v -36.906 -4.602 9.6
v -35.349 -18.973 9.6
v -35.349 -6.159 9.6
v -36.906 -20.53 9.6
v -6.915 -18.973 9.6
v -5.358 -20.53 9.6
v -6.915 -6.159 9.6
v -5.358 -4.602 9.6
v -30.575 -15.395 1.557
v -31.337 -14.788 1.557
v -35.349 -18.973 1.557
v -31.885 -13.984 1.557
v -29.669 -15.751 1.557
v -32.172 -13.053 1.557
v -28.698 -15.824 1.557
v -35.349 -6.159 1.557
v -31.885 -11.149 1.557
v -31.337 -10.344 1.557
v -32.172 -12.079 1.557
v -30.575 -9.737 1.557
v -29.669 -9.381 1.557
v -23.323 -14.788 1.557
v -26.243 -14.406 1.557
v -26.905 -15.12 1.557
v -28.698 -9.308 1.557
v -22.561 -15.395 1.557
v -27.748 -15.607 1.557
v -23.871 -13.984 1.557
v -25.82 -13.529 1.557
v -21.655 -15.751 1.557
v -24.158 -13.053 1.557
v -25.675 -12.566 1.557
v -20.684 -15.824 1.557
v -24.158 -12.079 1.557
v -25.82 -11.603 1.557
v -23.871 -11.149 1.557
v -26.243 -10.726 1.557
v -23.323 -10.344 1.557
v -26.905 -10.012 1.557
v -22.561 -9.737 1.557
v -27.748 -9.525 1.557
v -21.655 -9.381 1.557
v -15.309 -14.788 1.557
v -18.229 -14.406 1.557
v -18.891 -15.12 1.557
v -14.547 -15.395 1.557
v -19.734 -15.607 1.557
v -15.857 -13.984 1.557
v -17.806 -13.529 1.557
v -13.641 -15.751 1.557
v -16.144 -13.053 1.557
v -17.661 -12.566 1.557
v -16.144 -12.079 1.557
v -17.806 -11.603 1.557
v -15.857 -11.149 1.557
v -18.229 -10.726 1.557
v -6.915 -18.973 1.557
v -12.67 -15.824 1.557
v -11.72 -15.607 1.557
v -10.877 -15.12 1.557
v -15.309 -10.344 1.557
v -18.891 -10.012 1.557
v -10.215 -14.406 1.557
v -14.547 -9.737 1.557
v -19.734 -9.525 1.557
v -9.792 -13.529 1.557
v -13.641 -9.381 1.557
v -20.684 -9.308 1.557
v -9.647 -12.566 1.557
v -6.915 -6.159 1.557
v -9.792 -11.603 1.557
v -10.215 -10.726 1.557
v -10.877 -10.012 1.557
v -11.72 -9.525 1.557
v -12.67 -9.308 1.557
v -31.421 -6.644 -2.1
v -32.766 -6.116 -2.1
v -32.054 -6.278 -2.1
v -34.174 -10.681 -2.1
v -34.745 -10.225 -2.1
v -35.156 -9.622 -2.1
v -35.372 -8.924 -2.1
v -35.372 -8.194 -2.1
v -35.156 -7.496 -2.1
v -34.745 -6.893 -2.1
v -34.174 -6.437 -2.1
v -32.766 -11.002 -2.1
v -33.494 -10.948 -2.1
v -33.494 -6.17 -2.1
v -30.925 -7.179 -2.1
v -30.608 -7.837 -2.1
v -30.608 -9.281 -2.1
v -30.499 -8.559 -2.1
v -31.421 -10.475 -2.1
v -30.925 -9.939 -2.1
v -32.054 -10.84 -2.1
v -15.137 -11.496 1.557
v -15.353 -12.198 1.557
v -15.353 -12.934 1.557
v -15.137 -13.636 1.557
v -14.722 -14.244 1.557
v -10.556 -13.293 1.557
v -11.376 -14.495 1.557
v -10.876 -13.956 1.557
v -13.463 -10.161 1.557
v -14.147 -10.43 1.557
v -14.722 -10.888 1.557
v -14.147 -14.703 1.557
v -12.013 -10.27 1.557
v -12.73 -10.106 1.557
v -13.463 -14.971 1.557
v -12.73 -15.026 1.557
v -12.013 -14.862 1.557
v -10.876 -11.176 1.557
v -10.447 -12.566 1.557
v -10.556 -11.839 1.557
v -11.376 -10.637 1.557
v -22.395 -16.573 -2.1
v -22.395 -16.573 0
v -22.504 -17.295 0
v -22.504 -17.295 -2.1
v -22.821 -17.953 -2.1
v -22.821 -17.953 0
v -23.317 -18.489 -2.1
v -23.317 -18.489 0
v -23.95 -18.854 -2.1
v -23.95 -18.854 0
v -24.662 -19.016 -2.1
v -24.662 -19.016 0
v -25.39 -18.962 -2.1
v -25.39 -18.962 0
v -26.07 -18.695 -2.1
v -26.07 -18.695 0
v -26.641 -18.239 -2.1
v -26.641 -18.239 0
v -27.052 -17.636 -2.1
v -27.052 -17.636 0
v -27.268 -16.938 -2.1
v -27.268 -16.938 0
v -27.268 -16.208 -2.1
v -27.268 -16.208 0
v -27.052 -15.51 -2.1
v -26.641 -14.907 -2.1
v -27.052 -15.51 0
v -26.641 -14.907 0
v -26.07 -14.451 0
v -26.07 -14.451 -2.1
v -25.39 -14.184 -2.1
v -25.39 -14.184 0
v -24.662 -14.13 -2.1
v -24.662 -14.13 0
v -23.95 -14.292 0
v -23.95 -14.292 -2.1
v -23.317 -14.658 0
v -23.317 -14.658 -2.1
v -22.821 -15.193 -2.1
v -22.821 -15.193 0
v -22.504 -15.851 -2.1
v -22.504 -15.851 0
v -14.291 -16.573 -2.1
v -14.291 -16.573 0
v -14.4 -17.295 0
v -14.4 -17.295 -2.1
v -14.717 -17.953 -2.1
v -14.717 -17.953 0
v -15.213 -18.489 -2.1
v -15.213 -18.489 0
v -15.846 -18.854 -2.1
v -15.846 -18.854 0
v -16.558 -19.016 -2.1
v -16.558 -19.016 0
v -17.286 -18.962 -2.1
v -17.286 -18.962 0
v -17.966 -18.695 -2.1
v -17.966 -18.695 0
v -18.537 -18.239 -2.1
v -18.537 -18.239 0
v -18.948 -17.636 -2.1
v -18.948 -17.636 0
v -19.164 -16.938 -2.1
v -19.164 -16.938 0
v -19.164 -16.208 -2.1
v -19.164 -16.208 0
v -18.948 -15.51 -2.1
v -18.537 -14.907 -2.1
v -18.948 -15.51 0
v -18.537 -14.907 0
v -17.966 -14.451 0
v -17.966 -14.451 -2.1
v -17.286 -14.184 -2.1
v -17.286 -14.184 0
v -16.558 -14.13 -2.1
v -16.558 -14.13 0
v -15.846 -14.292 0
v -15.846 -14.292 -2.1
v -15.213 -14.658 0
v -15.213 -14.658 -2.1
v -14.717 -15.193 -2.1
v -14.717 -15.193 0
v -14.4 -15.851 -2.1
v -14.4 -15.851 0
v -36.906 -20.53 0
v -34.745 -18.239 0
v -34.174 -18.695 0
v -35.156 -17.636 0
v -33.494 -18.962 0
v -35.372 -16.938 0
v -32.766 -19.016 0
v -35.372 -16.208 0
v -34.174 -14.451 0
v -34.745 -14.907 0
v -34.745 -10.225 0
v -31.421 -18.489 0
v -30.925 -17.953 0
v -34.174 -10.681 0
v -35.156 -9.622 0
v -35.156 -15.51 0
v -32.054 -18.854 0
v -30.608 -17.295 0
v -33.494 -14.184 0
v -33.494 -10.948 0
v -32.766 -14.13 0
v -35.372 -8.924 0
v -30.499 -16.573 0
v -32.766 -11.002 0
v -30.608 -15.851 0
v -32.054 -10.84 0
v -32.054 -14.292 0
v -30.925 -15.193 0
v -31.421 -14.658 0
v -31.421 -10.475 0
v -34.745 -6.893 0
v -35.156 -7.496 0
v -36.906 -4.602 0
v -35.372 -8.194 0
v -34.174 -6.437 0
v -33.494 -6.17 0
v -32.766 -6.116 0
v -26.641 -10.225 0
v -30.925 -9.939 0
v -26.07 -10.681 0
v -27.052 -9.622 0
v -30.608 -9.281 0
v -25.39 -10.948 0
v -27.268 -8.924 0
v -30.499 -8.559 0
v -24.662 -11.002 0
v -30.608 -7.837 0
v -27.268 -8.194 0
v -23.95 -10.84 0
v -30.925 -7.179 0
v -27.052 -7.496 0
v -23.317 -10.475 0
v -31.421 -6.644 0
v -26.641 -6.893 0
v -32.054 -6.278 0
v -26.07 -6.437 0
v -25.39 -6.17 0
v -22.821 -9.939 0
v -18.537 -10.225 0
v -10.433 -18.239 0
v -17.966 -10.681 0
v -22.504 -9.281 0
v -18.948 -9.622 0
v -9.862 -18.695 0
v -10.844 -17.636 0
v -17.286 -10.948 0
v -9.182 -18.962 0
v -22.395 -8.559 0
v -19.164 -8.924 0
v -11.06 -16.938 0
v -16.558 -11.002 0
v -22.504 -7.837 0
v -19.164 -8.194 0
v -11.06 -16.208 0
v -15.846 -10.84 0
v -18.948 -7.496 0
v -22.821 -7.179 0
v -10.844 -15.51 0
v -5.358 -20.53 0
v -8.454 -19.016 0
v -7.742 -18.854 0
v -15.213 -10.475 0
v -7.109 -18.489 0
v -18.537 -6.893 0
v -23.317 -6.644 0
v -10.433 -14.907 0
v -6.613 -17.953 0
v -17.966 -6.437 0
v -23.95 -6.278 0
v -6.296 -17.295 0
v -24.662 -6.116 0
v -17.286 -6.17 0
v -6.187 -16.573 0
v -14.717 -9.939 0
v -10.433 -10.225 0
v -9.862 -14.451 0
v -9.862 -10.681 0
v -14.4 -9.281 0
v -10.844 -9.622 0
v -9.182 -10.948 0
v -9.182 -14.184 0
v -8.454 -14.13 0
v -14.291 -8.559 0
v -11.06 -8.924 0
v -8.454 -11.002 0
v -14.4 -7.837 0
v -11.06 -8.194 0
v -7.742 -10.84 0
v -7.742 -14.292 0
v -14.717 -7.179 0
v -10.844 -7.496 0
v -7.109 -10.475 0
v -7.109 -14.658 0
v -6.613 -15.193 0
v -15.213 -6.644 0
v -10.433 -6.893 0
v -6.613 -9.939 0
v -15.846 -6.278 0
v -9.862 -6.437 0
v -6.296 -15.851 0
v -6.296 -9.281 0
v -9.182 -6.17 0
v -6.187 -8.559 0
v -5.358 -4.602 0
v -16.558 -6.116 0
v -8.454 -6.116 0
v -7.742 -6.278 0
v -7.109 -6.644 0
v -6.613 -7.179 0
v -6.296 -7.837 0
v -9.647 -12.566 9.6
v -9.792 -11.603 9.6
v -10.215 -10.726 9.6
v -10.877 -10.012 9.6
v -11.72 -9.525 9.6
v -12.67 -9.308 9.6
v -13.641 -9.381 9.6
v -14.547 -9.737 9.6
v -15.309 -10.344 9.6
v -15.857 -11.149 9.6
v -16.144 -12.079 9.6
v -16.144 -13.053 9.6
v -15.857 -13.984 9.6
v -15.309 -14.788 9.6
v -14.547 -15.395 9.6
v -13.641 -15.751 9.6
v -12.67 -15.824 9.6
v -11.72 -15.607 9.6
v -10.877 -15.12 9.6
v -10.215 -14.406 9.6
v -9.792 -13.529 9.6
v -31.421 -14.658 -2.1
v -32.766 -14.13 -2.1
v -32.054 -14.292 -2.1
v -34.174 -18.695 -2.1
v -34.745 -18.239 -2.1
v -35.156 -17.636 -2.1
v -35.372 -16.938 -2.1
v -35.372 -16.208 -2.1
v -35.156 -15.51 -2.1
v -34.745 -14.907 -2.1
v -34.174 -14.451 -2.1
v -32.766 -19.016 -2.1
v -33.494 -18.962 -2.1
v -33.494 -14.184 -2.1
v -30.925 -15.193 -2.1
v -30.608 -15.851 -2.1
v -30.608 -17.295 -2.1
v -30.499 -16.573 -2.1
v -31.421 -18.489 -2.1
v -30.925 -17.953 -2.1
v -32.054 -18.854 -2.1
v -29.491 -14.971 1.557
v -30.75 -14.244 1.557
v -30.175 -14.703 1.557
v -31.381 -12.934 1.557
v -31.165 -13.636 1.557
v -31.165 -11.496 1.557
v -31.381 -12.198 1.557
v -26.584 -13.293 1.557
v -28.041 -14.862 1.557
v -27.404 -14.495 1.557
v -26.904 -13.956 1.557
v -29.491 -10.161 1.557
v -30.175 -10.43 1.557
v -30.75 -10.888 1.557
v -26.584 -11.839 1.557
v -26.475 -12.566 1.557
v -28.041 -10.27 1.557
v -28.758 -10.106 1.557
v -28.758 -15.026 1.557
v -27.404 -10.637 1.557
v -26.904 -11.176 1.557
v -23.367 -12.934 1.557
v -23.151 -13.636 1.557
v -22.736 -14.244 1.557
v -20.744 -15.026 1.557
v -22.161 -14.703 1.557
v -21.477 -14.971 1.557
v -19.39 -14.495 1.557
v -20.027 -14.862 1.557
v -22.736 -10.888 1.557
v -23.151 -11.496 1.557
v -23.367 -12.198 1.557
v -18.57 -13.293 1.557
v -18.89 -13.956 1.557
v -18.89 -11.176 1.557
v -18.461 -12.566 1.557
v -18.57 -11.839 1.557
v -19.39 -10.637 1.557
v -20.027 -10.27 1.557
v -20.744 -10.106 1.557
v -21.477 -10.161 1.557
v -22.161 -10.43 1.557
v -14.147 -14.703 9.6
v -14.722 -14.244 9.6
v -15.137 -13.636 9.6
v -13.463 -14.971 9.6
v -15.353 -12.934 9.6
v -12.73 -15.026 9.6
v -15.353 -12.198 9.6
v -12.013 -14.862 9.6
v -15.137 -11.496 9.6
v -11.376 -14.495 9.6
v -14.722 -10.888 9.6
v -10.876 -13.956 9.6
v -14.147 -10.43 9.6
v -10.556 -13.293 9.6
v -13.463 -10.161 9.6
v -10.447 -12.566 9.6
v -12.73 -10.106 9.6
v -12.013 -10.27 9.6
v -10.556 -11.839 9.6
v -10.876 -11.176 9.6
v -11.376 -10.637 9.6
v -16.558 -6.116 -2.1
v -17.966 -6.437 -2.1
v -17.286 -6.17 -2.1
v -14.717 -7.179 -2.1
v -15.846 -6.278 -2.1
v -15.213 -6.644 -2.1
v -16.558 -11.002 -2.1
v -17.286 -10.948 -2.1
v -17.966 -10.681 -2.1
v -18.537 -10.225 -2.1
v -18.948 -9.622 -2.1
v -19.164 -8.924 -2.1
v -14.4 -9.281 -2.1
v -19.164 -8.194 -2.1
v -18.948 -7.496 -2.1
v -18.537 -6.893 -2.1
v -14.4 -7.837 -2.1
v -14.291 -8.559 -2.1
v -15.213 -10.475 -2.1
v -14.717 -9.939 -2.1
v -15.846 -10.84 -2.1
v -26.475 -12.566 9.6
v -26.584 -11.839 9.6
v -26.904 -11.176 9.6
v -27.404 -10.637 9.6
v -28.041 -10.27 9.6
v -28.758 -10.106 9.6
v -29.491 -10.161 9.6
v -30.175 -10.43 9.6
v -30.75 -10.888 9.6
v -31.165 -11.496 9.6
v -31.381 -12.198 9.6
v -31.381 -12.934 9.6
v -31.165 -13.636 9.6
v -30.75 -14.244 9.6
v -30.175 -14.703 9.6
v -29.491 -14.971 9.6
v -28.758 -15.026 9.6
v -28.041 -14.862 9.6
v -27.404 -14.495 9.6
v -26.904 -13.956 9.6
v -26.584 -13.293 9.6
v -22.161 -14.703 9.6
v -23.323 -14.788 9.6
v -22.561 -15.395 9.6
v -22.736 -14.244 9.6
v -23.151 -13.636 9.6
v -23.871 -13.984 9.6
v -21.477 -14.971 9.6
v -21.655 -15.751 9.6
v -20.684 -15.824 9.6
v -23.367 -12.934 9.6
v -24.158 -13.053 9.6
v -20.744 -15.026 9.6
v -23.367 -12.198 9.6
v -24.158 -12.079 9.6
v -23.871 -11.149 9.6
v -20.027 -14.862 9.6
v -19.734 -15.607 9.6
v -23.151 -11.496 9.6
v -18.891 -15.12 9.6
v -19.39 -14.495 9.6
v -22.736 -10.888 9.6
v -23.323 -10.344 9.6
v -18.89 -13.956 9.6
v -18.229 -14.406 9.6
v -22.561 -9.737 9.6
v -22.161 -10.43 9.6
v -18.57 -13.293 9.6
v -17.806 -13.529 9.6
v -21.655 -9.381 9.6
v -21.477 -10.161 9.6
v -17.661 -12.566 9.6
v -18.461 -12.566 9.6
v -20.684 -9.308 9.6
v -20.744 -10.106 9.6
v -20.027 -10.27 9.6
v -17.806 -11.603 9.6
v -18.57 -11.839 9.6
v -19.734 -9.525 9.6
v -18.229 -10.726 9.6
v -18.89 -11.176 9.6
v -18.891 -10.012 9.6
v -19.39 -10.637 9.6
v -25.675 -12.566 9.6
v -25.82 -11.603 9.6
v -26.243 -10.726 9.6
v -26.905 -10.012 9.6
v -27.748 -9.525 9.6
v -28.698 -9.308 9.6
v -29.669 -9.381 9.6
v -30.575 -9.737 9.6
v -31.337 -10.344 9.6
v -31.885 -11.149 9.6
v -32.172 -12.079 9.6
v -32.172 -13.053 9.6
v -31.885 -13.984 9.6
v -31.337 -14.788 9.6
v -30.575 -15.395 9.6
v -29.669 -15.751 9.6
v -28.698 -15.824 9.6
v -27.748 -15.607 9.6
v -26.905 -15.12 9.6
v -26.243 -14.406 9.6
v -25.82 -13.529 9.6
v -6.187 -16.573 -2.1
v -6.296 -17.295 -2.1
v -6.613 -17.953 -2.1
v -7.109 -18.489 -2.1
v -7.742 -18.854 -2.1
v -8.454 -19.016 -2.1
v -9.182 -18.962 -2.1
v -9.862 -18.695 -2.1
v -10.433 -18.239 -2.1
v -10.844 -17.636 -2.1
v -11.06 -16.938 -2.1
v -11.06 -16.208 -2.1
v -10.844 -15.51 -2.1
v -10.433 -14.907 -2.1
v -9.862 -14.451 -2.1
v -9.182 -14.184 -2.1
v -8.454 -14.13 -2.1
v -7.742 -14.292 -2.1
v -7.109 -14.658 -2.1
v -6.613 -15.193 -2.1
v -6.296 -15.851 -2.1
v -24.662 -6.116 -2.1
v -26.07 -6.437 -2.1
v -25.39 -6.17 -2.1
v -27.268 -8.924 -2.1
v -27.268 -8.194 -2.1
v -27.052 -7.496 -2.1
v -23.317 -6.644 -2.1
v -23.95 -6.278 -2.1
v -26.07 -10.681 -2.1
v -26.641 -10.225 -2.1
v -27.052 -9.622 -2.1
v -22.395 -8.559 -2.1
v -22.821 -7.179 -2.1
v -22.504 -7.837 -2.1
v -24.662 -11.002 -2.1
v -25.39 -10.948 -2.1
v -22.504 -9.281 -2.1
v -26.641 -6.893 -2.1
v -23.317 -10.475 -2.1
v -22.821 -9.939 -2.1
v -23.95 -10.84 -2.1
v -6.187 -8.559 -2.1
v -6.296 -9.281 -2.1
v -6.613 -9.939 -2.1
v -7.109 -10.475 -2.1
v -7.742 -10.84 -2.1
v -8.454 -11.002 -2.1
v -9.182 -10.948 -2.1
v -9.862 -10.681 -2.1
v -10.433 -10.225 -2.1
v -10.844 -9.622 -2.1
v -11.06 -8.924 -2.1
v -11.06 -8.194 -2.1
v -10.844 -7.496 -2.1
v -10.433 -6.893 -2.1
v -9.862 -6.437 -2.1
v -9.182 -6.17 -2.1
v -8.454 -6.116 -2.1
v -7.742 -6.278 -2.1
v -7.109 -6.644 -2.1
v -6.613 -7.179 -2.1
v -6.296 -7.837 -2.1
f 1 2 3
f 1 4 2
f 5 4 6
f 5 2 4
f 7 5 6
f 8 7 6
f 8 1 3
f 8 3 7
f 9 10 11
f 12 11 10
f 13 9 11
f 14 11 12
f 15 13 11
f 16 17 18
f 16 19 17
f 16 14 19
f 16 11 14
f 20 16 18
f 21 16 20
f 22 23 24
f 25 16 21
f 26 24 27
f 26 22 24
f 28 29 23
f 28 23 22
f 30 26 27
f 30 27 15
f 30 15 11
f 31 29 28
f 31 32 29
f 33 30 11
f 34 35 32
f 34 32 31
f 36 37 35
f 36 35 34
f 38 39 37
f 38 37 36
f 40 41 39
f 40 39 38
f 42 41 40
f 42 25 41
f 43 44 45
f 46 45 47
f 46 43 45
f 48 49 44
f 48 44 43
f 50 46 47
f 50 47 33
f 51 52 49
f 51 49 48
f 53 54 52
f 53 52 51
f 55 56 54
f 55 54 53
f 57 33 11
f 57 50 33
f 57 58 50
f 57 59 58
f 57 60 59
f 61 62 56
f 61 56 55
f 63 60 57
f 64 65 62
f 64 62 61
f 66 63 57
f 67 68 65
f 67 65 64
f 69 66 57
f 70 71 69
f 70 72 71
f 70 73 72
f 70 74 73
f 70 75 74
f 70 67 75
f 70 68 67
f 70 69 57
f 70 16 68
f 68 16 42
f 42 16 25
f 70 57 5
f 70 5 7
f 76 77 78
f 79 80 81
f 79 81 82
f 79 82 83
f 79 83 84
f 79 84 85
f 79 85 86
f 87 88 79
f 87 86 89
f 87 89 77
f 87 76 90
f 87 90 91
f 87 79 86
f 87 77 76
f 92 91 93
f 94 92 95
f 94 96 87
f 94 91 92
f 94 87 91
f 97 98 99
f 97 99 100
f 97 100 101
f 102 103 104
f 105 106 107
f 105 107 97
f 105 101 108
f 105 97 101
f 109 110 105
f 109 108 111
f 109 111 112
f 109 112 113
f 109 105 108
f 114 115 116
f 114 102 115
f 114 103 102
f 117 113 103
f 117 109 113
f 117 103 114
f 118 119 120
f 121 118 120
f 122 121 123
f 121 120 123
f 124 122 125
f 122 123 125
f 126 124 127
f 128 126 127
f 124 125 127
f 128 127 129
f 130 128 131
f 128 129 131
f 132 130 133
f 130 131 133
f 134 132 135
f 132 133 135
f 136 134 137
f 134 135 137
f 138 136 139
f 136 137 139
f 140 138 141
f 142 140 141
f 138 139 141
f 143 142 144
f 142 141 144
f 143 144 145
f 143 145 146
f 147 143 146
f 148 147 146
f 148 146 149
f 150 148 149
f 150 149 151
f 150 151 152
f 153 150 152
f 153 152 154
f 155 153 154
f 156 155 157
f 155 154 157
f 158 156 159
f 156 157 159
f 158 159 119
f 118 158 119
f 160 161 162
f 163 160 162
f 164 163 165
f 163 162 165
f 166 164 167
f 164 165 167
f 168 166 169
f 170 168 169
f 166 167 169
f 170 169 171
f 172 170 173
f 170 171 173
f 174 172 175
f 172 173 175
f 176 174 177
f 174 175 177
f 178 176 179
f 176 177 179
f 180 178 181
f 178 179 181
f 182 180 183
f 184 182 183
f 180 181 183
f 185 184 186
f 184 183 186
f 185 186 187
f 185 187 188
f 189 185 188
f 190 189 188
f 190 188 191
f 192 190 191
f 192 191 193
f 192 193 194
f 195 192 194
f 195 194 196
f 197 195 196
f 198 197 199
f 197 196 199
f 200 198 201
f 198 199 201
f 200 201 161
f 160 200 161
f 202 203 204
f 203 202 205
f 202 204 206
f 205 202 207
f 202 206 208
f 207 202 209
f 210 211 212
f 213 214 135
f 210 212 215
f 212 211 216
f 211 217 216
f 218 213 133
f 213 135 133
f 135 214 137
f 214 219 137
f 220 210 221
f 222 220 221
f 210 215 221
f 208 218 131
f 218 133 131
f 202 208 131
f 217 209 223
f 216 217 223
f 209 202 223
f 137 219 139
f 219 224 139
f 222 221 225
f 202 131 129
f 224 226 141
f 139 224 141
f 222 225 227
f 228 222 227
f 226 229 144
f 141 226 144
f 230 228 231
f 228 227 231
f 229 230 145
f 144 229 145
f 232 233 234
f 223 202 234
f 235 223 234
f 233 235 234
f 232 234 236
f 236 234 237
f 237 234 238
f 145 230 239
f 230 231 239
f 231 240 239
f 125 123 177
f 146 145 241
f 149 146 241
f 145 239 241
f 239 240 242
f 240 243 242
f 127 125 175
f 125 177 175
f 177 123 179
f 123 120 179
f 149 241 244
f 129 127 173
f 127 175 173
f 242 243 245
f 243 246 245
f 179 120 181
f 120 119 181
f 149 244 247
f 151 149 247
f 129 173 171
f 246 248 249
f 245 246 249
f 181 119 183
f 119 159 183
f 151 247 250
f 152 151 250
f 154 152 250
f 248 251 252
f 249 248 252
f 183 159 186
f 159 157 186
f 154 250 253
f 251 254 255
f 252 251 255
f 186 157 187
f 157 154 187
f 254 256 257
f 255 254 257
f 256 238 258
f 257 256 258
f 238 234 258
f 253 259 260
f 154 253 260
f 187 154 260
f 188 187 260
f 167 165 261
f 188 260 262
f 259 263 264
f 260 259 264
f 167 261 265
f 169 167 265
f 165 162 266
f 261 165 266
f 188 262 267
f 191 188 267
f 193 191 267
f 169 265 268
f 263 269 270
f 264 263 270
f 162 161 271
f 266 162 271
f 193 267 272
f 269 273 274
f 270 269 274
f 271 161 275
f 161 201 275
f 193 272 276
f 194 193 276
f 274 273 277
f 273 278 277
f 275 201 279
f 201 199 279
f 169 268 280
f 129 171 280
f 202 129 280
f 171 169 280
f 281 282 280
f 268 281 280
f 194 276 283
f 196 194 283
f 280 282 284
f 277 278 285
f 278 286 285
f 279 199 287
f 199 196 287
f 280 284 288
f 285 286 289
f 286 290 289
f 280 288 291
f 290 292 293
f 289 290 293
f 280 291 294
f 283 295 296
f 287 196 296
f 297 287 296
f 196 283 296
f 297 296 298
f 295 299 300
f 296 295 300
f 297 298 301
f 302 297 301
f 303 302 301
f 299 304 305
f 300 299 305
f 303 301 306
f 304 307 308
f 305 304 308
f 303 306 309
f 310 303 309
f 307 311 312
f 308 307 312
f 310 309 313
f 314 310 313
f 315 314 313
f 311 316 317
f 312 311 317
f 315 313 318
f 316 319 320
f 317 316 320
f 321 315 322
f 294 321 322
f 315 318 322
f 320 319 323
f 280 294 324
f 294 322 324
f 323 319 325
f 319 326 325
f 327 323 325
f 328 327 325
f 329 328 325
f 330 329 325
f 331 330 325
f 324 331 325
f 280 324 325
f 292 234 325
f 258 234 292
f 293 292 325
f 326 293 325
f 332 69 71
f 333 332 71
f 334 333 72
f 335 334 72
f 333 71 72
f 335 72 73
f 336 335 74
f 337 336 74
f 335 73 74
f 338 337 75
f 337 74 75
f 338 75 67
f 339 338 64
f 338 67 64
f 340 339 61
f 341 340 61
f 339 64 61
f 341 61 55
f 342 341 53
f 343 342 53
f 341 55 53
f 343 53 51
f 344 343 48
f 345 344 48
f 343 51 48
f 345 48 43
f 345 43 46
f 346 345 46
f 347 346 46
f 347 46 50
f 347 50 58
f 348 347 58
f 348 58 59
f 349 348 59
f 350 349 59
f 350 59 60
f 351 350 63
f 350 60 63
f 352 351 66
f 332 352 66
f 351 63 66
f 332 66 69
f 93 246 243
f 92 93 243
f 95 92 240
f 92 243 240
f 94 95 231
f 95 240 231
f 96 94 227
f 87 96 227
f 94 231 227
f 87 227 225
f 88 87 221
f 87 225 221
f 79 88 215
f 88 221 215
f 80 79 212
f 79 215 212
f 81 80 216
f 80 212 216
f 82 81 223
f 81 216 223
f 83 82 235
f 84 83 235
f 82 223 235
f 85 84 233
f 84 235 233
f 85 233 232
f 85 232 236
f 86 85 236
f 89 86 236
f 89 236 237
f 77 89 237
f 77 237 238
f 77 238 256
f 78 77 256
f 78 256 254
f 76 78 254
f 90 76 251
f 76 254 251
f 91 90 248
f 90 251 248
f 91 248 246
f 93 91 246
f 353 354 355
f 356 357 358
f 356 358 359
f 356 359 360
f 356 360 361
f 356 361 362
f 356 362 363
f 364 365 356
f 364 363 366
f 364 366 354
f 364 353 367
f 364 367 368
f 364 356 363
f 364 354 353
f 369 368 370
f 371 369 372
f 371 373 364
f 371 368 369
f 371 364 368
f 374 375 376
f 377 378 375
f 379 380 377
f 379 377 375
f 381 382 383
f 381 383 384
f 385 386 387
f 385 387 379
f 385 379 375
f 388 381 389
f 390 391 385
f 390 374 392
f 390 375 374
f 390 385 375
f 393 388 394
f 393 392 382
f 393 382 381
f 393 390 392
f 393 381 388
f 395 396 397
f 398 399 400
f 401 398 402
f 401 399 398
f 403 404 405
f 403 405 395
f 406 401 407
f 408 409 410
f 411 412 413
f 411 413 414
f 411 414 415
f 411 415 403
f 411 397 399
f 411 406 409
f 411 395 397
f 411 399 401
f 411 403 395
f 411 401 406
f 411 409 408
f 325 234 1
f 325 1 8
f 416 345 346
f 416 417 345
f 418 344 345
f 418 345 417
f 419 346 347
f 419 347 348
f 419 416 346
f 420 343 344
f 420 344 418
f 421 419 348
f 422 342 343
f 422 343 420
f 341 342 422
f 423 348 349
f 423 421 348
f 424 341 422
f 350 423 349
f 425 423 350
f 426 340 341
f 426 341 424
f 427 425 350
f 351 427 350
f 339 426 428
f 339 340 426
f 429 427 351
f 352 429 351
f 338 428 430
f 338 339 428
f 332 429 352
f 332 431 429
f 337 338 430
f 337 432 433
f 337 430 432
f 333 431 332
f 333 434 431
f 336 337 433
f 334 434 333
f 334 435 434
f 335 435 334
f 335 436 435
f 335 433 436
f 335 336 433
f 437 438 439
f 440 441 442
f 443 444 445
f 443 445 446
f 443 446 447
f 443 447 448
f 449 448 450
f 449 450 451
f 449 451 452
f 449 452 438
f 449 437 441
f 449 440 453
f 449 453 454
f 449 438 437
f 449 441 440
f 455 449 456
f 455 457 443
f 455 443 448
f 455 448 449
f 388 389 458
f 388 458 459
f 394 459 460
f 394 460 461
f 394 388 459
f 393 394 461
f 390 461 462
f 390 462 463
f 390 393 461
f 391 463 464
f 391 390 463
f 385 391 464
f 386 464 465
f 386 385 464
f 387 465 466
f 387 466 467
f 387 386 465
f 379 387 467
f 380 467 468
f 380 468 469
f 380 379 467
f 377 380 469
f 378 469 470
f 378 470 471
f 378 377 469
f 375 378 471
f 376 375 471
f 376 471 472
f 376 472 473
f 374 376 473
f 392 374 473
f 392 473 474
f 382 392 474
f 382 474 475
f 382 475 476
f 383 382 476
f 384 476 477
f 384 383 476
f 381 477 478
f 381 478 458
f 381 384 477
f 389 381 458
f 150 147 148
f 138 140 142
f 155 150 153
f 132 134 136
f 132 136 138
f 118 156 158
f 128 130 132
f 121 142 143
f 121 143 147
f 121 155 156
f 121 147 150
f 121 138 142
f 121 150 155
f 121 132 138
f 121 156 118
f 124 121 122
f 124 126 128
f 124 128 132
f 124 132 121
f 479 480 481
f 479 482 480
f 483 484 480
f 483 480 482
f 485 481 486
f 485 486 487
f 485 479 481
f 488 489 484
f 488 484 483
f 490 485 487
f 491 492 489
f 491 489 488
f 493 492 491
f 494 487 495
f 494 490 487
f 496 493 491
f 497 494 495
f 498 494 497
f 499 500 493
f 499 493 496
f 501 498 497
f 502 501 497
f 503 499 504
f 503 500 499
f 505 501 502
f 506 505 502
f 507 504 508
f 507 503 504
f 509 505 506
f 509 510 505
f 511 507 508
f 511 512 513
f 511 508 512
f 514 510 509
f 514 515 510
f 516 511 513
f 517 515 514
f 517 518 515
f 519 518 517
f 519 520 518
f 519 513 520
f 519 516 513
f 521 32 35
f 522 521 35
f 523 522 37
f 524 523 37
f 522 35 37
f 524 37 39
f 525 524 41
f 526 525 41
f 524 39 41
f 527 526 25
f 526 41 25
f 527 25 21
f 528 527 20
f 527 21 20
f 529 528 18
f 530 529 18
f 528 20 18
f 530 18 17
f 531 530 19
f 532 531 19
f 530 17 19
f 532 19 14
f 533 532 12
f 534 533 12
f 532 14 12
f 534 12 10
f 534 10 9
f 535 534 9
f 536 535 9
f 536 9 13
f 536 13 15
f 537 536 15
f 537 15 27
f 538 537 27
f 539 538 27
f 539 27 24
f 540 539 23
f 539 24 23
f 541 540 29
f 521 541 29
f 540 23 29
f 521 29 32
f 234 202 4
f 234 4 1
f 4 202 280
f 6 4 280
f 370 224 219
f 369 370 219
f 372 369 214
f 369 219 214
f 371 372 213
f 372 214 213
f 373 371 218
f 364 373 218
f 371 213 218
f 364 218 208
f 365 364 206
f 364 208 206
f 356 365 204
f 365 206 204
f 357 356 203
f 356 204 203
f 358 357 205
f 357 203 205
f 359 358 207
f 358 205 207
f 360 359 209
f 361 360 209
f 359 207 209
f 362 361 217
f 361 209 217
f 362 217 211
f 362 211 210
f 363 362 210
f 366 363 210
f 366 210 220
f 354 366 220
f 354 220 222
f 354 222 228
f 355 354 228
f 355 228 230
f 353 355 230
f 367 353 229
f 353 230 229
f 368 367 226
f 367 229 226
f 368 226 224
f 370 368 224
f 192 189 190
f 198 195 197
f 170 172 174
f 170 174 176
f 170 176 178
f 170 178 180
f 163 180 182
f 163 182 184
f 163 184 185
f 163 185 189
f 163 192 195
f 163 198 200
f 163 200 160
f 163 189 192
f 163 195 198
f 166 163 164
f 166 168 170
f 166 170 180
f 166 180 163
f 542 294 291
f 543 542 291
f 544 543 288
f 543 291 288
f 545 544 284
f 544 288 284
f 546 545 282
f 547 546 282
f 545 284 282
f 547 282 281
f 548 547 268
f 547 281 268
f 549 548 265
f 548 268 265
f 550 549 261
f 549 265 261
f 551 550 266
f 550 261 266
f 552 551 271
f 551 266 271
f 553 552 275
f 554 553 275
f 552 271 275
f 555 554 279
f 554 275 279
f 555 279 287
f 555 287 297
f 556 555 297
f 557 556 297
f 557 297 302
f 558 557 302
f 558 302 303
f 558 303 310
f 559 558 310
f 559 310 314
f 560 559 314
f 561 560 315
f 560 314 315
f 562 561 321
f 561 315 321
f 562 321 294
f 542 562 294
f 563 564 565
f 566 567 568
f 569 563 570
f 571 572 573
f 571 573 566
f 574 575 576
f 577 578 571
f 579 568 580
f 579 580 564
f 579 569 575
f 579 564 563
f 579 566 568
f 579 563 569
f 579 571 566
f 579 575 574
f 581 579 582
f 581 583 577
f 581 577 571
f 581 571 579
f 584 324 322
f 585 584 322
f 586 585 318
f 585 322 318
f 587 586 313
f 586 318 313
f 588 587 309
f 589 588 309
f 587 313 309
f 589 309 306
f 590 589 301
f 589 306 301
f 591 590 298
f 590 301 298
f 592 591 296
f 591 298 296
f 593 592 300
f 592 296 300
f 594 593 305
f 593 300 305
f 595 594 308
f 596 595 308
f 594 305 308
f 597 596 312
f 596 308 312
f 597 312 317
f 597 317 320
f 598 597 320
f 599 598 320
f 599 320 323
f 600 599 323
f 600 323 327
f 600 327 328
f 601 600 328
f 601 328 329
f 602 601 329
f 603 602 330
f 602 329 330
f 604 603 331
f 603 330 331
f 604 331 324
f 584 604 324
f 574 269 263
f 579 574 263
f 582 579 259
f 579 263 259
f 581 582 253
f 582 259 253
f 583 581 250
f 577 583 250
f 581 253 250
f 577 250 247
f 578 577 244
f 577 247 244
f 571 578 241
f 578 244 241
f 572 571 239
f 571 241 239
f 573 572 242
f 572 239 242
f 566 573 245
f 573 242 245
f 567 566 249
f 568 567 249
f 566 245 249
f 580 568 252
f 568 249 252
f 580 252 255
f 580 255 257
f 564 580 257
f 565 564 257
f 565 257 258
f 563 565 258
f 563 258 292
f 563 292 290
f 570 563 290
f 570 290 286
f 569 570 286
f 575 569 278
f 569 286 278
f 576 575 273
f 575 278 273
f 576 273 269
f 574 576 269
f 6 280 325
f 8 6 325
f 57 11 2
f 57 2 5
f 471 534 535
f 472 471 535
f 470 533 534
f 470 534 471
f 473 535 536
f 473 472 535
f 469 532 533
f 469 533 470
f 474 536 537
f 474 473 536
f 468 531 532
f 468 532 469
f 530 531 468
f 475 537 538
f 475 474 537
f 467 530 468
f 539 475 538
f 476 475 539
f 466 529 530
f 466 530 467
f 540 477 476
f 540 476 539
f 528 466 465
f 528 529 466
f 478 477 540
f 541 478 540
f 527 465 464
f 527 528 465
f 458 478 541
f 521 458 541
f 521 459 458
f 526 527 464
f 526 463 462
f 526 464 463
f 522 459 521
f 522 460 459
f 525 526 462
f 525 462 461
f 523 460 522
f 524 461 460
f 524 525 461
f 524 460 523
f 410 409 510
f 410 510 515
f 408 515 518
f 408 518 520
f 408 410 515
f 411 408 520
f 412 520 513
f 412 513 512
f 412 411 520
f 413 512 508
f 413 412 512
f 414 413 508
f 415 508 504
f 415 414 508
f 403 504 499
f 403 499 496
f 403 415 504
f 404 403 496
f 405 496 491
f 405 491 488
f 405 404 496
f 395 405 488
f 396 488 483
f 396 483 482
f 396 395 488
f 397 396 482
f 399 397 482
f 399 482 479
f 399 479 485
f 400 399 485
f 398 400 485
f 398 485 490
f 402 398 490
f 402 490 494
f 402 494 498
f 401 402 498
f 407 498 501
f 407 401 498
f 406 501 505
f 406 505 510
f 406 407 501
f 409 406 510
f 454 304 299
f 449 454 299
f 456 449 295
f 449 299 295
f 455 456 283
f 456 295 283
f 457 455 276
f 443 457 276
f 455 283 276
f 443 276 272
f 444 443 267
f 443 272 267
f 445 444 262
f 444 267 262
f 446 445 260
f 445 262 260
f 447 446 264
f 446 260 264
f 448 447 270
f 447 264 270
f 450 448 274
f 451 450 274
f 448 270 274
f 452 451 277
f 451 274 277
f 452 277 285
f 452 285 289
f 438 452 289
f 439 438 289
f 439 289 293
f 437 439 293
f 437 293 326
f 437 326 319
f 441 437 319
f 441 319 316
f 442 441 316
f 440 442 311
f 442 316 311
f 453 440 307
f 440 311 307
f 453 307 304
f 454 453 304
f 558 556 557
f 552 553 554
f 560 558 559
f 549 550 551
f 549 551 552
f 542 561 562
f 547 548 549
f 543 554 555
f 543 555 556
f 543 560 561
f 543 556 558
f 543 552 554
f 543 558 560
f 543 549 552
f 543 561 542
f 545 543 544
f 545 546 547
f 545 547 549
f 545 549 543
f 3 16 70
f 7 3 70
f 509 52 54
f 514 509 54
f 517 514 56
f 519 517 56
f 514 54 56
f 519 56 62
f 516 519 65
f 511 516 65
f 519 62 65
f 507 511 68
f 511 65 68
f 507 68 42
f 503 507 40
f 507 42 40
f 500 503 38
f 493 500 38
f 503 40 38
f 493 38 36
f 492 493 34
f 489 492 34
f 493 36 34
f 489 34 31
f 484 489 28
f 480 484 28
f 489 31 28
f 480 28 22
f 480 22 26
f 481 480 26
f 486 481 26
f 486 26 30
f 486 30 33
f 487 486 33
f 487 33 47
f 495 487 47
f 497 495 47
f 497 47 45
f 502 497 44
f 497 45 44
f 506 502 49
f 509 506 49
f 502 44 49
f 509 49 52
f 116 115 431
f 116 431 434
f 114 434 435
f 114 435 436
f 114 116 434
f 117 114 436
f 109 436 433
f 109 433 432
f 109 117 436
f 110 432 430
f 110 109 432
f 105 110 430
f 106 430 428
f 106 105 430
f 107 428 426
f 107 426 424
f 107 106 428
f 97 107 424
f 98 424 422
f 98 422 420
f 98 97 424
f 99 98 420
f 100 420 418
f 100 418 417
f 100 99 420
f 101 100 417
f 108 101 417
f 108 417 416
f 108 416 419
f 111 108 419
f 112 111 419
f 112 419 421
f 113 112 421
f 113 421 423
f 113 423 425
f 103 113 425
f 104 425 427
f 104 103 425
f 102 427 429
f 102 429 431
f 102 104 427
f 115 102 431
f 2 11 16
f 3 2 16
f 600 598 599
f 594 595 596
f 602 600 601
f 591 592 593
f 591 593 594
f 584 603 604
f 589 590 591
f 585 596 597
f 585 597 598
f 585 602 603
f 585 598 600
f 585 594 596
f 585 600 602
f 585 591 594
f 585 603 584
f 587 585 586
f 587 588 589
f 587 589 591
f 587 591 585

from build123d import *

# Parameters (mm, degrees)
F0_W     = 31.548
F0_H     = 15.928
F0_W_2   = 28.434
F0_H_2   = 12.814
F1_DEPTH = 9.6
F2_DEPTH = 25
F3_DEPTH = 1.557
F4_R     = 3.267
F4_R_2   = 2.467
F5_DEPTH = 8.043
F6_R     = 2.45
F7_DEPTH = 2.1


with BuildPart() as f1:
    # F0 (on Top) → F1 (new body)
    with BuildSketch(Plane.XY):
        with Locations((-21.131882, -12.566023)):
            Rectangle(F0_W, F0_H)
        with Locations((-21.131882, -12.566023)):
            Rectangle(F0_W_2, F0_H_2, mode=Mode.SUBTRACT)
        with Locations((-21.131882, -12.566023)):
            Rectangle(F0_W_2, F0_H_2)
    extrude(amount=F1_DEPTH)

    # F0 (on Top) → F2 (cut)
    with BuildSketch(Plane.XY):
        with Locations((-21.131882, -12.566023)):
            Rectangle(F0_W_2, F0_H_2)
    extrude(amount=F2_DEPTH, mode=Mode.SUBTRACT)

    # F0 (on Top) → F3 (join)
    with BuildSketch(Plane.XY):
        with Locations((-21.131882, -12.566023)):
            Rectangle(F0_W_2, F0_H_2)
    extrude(amount=F3_DEPTH)

    # F4 (on face) → F5 (join)
    with BuildSketch(Plane.XY.offset(1.557)):
        with Locations((-28.941882, -12.566023)):
            Circle(F4_R)
        with Locations((-28.941882, -12.566023)):
            Circle(F4_R_2, mode=Mode.SUBTRACT)
        with Locations((-20.927882, -12.566023)):
            Circle(F4_R)
        with Locations((-20.927882, -12.566023)):
            Circle(F4_R_2, mode=Mode.SUBTRACT)
        with Locations((-12.913882, -12.566023)):
            Circle(F4_R)
        with Locations((-12.913882, -12.566023)):
            Circle(F4_R_2, mode=Mode.SUBTRACT)
    extrude(amount=F5_DEPTH)

    # F6 (on face) → F7 (join)
    with BuildSketch(Plane(origin=(0, 0, 0), x_dir=(1, 0, 0), z_dir=(0, 0, -1))):
        with Locations((-32.948882, 16.573023)):
            Circle(F6_R)
        with Locations((-24.844882, 16.573023)):
            Circle(F6_R)
        with Locations((-16.740882, 16.573023)):
            Circle(F6_R)
        with Locations((-8.636882, 16.573023)):
            Circle(F6_R)
        with Locations((-8.636882, 8.559023)):
            Circle(F6_R)
        with Locations((-16.740882, 8.559023)):
            Circle(F6_R)
        with Locations((-24.844882, 8.559023)):
            Circle(F6_R)
        with Locations((-32.948882, 8.559023)):
            Circle(F6_R)
    extrude(amount=F7_DEPTH)


solid = f1.part
